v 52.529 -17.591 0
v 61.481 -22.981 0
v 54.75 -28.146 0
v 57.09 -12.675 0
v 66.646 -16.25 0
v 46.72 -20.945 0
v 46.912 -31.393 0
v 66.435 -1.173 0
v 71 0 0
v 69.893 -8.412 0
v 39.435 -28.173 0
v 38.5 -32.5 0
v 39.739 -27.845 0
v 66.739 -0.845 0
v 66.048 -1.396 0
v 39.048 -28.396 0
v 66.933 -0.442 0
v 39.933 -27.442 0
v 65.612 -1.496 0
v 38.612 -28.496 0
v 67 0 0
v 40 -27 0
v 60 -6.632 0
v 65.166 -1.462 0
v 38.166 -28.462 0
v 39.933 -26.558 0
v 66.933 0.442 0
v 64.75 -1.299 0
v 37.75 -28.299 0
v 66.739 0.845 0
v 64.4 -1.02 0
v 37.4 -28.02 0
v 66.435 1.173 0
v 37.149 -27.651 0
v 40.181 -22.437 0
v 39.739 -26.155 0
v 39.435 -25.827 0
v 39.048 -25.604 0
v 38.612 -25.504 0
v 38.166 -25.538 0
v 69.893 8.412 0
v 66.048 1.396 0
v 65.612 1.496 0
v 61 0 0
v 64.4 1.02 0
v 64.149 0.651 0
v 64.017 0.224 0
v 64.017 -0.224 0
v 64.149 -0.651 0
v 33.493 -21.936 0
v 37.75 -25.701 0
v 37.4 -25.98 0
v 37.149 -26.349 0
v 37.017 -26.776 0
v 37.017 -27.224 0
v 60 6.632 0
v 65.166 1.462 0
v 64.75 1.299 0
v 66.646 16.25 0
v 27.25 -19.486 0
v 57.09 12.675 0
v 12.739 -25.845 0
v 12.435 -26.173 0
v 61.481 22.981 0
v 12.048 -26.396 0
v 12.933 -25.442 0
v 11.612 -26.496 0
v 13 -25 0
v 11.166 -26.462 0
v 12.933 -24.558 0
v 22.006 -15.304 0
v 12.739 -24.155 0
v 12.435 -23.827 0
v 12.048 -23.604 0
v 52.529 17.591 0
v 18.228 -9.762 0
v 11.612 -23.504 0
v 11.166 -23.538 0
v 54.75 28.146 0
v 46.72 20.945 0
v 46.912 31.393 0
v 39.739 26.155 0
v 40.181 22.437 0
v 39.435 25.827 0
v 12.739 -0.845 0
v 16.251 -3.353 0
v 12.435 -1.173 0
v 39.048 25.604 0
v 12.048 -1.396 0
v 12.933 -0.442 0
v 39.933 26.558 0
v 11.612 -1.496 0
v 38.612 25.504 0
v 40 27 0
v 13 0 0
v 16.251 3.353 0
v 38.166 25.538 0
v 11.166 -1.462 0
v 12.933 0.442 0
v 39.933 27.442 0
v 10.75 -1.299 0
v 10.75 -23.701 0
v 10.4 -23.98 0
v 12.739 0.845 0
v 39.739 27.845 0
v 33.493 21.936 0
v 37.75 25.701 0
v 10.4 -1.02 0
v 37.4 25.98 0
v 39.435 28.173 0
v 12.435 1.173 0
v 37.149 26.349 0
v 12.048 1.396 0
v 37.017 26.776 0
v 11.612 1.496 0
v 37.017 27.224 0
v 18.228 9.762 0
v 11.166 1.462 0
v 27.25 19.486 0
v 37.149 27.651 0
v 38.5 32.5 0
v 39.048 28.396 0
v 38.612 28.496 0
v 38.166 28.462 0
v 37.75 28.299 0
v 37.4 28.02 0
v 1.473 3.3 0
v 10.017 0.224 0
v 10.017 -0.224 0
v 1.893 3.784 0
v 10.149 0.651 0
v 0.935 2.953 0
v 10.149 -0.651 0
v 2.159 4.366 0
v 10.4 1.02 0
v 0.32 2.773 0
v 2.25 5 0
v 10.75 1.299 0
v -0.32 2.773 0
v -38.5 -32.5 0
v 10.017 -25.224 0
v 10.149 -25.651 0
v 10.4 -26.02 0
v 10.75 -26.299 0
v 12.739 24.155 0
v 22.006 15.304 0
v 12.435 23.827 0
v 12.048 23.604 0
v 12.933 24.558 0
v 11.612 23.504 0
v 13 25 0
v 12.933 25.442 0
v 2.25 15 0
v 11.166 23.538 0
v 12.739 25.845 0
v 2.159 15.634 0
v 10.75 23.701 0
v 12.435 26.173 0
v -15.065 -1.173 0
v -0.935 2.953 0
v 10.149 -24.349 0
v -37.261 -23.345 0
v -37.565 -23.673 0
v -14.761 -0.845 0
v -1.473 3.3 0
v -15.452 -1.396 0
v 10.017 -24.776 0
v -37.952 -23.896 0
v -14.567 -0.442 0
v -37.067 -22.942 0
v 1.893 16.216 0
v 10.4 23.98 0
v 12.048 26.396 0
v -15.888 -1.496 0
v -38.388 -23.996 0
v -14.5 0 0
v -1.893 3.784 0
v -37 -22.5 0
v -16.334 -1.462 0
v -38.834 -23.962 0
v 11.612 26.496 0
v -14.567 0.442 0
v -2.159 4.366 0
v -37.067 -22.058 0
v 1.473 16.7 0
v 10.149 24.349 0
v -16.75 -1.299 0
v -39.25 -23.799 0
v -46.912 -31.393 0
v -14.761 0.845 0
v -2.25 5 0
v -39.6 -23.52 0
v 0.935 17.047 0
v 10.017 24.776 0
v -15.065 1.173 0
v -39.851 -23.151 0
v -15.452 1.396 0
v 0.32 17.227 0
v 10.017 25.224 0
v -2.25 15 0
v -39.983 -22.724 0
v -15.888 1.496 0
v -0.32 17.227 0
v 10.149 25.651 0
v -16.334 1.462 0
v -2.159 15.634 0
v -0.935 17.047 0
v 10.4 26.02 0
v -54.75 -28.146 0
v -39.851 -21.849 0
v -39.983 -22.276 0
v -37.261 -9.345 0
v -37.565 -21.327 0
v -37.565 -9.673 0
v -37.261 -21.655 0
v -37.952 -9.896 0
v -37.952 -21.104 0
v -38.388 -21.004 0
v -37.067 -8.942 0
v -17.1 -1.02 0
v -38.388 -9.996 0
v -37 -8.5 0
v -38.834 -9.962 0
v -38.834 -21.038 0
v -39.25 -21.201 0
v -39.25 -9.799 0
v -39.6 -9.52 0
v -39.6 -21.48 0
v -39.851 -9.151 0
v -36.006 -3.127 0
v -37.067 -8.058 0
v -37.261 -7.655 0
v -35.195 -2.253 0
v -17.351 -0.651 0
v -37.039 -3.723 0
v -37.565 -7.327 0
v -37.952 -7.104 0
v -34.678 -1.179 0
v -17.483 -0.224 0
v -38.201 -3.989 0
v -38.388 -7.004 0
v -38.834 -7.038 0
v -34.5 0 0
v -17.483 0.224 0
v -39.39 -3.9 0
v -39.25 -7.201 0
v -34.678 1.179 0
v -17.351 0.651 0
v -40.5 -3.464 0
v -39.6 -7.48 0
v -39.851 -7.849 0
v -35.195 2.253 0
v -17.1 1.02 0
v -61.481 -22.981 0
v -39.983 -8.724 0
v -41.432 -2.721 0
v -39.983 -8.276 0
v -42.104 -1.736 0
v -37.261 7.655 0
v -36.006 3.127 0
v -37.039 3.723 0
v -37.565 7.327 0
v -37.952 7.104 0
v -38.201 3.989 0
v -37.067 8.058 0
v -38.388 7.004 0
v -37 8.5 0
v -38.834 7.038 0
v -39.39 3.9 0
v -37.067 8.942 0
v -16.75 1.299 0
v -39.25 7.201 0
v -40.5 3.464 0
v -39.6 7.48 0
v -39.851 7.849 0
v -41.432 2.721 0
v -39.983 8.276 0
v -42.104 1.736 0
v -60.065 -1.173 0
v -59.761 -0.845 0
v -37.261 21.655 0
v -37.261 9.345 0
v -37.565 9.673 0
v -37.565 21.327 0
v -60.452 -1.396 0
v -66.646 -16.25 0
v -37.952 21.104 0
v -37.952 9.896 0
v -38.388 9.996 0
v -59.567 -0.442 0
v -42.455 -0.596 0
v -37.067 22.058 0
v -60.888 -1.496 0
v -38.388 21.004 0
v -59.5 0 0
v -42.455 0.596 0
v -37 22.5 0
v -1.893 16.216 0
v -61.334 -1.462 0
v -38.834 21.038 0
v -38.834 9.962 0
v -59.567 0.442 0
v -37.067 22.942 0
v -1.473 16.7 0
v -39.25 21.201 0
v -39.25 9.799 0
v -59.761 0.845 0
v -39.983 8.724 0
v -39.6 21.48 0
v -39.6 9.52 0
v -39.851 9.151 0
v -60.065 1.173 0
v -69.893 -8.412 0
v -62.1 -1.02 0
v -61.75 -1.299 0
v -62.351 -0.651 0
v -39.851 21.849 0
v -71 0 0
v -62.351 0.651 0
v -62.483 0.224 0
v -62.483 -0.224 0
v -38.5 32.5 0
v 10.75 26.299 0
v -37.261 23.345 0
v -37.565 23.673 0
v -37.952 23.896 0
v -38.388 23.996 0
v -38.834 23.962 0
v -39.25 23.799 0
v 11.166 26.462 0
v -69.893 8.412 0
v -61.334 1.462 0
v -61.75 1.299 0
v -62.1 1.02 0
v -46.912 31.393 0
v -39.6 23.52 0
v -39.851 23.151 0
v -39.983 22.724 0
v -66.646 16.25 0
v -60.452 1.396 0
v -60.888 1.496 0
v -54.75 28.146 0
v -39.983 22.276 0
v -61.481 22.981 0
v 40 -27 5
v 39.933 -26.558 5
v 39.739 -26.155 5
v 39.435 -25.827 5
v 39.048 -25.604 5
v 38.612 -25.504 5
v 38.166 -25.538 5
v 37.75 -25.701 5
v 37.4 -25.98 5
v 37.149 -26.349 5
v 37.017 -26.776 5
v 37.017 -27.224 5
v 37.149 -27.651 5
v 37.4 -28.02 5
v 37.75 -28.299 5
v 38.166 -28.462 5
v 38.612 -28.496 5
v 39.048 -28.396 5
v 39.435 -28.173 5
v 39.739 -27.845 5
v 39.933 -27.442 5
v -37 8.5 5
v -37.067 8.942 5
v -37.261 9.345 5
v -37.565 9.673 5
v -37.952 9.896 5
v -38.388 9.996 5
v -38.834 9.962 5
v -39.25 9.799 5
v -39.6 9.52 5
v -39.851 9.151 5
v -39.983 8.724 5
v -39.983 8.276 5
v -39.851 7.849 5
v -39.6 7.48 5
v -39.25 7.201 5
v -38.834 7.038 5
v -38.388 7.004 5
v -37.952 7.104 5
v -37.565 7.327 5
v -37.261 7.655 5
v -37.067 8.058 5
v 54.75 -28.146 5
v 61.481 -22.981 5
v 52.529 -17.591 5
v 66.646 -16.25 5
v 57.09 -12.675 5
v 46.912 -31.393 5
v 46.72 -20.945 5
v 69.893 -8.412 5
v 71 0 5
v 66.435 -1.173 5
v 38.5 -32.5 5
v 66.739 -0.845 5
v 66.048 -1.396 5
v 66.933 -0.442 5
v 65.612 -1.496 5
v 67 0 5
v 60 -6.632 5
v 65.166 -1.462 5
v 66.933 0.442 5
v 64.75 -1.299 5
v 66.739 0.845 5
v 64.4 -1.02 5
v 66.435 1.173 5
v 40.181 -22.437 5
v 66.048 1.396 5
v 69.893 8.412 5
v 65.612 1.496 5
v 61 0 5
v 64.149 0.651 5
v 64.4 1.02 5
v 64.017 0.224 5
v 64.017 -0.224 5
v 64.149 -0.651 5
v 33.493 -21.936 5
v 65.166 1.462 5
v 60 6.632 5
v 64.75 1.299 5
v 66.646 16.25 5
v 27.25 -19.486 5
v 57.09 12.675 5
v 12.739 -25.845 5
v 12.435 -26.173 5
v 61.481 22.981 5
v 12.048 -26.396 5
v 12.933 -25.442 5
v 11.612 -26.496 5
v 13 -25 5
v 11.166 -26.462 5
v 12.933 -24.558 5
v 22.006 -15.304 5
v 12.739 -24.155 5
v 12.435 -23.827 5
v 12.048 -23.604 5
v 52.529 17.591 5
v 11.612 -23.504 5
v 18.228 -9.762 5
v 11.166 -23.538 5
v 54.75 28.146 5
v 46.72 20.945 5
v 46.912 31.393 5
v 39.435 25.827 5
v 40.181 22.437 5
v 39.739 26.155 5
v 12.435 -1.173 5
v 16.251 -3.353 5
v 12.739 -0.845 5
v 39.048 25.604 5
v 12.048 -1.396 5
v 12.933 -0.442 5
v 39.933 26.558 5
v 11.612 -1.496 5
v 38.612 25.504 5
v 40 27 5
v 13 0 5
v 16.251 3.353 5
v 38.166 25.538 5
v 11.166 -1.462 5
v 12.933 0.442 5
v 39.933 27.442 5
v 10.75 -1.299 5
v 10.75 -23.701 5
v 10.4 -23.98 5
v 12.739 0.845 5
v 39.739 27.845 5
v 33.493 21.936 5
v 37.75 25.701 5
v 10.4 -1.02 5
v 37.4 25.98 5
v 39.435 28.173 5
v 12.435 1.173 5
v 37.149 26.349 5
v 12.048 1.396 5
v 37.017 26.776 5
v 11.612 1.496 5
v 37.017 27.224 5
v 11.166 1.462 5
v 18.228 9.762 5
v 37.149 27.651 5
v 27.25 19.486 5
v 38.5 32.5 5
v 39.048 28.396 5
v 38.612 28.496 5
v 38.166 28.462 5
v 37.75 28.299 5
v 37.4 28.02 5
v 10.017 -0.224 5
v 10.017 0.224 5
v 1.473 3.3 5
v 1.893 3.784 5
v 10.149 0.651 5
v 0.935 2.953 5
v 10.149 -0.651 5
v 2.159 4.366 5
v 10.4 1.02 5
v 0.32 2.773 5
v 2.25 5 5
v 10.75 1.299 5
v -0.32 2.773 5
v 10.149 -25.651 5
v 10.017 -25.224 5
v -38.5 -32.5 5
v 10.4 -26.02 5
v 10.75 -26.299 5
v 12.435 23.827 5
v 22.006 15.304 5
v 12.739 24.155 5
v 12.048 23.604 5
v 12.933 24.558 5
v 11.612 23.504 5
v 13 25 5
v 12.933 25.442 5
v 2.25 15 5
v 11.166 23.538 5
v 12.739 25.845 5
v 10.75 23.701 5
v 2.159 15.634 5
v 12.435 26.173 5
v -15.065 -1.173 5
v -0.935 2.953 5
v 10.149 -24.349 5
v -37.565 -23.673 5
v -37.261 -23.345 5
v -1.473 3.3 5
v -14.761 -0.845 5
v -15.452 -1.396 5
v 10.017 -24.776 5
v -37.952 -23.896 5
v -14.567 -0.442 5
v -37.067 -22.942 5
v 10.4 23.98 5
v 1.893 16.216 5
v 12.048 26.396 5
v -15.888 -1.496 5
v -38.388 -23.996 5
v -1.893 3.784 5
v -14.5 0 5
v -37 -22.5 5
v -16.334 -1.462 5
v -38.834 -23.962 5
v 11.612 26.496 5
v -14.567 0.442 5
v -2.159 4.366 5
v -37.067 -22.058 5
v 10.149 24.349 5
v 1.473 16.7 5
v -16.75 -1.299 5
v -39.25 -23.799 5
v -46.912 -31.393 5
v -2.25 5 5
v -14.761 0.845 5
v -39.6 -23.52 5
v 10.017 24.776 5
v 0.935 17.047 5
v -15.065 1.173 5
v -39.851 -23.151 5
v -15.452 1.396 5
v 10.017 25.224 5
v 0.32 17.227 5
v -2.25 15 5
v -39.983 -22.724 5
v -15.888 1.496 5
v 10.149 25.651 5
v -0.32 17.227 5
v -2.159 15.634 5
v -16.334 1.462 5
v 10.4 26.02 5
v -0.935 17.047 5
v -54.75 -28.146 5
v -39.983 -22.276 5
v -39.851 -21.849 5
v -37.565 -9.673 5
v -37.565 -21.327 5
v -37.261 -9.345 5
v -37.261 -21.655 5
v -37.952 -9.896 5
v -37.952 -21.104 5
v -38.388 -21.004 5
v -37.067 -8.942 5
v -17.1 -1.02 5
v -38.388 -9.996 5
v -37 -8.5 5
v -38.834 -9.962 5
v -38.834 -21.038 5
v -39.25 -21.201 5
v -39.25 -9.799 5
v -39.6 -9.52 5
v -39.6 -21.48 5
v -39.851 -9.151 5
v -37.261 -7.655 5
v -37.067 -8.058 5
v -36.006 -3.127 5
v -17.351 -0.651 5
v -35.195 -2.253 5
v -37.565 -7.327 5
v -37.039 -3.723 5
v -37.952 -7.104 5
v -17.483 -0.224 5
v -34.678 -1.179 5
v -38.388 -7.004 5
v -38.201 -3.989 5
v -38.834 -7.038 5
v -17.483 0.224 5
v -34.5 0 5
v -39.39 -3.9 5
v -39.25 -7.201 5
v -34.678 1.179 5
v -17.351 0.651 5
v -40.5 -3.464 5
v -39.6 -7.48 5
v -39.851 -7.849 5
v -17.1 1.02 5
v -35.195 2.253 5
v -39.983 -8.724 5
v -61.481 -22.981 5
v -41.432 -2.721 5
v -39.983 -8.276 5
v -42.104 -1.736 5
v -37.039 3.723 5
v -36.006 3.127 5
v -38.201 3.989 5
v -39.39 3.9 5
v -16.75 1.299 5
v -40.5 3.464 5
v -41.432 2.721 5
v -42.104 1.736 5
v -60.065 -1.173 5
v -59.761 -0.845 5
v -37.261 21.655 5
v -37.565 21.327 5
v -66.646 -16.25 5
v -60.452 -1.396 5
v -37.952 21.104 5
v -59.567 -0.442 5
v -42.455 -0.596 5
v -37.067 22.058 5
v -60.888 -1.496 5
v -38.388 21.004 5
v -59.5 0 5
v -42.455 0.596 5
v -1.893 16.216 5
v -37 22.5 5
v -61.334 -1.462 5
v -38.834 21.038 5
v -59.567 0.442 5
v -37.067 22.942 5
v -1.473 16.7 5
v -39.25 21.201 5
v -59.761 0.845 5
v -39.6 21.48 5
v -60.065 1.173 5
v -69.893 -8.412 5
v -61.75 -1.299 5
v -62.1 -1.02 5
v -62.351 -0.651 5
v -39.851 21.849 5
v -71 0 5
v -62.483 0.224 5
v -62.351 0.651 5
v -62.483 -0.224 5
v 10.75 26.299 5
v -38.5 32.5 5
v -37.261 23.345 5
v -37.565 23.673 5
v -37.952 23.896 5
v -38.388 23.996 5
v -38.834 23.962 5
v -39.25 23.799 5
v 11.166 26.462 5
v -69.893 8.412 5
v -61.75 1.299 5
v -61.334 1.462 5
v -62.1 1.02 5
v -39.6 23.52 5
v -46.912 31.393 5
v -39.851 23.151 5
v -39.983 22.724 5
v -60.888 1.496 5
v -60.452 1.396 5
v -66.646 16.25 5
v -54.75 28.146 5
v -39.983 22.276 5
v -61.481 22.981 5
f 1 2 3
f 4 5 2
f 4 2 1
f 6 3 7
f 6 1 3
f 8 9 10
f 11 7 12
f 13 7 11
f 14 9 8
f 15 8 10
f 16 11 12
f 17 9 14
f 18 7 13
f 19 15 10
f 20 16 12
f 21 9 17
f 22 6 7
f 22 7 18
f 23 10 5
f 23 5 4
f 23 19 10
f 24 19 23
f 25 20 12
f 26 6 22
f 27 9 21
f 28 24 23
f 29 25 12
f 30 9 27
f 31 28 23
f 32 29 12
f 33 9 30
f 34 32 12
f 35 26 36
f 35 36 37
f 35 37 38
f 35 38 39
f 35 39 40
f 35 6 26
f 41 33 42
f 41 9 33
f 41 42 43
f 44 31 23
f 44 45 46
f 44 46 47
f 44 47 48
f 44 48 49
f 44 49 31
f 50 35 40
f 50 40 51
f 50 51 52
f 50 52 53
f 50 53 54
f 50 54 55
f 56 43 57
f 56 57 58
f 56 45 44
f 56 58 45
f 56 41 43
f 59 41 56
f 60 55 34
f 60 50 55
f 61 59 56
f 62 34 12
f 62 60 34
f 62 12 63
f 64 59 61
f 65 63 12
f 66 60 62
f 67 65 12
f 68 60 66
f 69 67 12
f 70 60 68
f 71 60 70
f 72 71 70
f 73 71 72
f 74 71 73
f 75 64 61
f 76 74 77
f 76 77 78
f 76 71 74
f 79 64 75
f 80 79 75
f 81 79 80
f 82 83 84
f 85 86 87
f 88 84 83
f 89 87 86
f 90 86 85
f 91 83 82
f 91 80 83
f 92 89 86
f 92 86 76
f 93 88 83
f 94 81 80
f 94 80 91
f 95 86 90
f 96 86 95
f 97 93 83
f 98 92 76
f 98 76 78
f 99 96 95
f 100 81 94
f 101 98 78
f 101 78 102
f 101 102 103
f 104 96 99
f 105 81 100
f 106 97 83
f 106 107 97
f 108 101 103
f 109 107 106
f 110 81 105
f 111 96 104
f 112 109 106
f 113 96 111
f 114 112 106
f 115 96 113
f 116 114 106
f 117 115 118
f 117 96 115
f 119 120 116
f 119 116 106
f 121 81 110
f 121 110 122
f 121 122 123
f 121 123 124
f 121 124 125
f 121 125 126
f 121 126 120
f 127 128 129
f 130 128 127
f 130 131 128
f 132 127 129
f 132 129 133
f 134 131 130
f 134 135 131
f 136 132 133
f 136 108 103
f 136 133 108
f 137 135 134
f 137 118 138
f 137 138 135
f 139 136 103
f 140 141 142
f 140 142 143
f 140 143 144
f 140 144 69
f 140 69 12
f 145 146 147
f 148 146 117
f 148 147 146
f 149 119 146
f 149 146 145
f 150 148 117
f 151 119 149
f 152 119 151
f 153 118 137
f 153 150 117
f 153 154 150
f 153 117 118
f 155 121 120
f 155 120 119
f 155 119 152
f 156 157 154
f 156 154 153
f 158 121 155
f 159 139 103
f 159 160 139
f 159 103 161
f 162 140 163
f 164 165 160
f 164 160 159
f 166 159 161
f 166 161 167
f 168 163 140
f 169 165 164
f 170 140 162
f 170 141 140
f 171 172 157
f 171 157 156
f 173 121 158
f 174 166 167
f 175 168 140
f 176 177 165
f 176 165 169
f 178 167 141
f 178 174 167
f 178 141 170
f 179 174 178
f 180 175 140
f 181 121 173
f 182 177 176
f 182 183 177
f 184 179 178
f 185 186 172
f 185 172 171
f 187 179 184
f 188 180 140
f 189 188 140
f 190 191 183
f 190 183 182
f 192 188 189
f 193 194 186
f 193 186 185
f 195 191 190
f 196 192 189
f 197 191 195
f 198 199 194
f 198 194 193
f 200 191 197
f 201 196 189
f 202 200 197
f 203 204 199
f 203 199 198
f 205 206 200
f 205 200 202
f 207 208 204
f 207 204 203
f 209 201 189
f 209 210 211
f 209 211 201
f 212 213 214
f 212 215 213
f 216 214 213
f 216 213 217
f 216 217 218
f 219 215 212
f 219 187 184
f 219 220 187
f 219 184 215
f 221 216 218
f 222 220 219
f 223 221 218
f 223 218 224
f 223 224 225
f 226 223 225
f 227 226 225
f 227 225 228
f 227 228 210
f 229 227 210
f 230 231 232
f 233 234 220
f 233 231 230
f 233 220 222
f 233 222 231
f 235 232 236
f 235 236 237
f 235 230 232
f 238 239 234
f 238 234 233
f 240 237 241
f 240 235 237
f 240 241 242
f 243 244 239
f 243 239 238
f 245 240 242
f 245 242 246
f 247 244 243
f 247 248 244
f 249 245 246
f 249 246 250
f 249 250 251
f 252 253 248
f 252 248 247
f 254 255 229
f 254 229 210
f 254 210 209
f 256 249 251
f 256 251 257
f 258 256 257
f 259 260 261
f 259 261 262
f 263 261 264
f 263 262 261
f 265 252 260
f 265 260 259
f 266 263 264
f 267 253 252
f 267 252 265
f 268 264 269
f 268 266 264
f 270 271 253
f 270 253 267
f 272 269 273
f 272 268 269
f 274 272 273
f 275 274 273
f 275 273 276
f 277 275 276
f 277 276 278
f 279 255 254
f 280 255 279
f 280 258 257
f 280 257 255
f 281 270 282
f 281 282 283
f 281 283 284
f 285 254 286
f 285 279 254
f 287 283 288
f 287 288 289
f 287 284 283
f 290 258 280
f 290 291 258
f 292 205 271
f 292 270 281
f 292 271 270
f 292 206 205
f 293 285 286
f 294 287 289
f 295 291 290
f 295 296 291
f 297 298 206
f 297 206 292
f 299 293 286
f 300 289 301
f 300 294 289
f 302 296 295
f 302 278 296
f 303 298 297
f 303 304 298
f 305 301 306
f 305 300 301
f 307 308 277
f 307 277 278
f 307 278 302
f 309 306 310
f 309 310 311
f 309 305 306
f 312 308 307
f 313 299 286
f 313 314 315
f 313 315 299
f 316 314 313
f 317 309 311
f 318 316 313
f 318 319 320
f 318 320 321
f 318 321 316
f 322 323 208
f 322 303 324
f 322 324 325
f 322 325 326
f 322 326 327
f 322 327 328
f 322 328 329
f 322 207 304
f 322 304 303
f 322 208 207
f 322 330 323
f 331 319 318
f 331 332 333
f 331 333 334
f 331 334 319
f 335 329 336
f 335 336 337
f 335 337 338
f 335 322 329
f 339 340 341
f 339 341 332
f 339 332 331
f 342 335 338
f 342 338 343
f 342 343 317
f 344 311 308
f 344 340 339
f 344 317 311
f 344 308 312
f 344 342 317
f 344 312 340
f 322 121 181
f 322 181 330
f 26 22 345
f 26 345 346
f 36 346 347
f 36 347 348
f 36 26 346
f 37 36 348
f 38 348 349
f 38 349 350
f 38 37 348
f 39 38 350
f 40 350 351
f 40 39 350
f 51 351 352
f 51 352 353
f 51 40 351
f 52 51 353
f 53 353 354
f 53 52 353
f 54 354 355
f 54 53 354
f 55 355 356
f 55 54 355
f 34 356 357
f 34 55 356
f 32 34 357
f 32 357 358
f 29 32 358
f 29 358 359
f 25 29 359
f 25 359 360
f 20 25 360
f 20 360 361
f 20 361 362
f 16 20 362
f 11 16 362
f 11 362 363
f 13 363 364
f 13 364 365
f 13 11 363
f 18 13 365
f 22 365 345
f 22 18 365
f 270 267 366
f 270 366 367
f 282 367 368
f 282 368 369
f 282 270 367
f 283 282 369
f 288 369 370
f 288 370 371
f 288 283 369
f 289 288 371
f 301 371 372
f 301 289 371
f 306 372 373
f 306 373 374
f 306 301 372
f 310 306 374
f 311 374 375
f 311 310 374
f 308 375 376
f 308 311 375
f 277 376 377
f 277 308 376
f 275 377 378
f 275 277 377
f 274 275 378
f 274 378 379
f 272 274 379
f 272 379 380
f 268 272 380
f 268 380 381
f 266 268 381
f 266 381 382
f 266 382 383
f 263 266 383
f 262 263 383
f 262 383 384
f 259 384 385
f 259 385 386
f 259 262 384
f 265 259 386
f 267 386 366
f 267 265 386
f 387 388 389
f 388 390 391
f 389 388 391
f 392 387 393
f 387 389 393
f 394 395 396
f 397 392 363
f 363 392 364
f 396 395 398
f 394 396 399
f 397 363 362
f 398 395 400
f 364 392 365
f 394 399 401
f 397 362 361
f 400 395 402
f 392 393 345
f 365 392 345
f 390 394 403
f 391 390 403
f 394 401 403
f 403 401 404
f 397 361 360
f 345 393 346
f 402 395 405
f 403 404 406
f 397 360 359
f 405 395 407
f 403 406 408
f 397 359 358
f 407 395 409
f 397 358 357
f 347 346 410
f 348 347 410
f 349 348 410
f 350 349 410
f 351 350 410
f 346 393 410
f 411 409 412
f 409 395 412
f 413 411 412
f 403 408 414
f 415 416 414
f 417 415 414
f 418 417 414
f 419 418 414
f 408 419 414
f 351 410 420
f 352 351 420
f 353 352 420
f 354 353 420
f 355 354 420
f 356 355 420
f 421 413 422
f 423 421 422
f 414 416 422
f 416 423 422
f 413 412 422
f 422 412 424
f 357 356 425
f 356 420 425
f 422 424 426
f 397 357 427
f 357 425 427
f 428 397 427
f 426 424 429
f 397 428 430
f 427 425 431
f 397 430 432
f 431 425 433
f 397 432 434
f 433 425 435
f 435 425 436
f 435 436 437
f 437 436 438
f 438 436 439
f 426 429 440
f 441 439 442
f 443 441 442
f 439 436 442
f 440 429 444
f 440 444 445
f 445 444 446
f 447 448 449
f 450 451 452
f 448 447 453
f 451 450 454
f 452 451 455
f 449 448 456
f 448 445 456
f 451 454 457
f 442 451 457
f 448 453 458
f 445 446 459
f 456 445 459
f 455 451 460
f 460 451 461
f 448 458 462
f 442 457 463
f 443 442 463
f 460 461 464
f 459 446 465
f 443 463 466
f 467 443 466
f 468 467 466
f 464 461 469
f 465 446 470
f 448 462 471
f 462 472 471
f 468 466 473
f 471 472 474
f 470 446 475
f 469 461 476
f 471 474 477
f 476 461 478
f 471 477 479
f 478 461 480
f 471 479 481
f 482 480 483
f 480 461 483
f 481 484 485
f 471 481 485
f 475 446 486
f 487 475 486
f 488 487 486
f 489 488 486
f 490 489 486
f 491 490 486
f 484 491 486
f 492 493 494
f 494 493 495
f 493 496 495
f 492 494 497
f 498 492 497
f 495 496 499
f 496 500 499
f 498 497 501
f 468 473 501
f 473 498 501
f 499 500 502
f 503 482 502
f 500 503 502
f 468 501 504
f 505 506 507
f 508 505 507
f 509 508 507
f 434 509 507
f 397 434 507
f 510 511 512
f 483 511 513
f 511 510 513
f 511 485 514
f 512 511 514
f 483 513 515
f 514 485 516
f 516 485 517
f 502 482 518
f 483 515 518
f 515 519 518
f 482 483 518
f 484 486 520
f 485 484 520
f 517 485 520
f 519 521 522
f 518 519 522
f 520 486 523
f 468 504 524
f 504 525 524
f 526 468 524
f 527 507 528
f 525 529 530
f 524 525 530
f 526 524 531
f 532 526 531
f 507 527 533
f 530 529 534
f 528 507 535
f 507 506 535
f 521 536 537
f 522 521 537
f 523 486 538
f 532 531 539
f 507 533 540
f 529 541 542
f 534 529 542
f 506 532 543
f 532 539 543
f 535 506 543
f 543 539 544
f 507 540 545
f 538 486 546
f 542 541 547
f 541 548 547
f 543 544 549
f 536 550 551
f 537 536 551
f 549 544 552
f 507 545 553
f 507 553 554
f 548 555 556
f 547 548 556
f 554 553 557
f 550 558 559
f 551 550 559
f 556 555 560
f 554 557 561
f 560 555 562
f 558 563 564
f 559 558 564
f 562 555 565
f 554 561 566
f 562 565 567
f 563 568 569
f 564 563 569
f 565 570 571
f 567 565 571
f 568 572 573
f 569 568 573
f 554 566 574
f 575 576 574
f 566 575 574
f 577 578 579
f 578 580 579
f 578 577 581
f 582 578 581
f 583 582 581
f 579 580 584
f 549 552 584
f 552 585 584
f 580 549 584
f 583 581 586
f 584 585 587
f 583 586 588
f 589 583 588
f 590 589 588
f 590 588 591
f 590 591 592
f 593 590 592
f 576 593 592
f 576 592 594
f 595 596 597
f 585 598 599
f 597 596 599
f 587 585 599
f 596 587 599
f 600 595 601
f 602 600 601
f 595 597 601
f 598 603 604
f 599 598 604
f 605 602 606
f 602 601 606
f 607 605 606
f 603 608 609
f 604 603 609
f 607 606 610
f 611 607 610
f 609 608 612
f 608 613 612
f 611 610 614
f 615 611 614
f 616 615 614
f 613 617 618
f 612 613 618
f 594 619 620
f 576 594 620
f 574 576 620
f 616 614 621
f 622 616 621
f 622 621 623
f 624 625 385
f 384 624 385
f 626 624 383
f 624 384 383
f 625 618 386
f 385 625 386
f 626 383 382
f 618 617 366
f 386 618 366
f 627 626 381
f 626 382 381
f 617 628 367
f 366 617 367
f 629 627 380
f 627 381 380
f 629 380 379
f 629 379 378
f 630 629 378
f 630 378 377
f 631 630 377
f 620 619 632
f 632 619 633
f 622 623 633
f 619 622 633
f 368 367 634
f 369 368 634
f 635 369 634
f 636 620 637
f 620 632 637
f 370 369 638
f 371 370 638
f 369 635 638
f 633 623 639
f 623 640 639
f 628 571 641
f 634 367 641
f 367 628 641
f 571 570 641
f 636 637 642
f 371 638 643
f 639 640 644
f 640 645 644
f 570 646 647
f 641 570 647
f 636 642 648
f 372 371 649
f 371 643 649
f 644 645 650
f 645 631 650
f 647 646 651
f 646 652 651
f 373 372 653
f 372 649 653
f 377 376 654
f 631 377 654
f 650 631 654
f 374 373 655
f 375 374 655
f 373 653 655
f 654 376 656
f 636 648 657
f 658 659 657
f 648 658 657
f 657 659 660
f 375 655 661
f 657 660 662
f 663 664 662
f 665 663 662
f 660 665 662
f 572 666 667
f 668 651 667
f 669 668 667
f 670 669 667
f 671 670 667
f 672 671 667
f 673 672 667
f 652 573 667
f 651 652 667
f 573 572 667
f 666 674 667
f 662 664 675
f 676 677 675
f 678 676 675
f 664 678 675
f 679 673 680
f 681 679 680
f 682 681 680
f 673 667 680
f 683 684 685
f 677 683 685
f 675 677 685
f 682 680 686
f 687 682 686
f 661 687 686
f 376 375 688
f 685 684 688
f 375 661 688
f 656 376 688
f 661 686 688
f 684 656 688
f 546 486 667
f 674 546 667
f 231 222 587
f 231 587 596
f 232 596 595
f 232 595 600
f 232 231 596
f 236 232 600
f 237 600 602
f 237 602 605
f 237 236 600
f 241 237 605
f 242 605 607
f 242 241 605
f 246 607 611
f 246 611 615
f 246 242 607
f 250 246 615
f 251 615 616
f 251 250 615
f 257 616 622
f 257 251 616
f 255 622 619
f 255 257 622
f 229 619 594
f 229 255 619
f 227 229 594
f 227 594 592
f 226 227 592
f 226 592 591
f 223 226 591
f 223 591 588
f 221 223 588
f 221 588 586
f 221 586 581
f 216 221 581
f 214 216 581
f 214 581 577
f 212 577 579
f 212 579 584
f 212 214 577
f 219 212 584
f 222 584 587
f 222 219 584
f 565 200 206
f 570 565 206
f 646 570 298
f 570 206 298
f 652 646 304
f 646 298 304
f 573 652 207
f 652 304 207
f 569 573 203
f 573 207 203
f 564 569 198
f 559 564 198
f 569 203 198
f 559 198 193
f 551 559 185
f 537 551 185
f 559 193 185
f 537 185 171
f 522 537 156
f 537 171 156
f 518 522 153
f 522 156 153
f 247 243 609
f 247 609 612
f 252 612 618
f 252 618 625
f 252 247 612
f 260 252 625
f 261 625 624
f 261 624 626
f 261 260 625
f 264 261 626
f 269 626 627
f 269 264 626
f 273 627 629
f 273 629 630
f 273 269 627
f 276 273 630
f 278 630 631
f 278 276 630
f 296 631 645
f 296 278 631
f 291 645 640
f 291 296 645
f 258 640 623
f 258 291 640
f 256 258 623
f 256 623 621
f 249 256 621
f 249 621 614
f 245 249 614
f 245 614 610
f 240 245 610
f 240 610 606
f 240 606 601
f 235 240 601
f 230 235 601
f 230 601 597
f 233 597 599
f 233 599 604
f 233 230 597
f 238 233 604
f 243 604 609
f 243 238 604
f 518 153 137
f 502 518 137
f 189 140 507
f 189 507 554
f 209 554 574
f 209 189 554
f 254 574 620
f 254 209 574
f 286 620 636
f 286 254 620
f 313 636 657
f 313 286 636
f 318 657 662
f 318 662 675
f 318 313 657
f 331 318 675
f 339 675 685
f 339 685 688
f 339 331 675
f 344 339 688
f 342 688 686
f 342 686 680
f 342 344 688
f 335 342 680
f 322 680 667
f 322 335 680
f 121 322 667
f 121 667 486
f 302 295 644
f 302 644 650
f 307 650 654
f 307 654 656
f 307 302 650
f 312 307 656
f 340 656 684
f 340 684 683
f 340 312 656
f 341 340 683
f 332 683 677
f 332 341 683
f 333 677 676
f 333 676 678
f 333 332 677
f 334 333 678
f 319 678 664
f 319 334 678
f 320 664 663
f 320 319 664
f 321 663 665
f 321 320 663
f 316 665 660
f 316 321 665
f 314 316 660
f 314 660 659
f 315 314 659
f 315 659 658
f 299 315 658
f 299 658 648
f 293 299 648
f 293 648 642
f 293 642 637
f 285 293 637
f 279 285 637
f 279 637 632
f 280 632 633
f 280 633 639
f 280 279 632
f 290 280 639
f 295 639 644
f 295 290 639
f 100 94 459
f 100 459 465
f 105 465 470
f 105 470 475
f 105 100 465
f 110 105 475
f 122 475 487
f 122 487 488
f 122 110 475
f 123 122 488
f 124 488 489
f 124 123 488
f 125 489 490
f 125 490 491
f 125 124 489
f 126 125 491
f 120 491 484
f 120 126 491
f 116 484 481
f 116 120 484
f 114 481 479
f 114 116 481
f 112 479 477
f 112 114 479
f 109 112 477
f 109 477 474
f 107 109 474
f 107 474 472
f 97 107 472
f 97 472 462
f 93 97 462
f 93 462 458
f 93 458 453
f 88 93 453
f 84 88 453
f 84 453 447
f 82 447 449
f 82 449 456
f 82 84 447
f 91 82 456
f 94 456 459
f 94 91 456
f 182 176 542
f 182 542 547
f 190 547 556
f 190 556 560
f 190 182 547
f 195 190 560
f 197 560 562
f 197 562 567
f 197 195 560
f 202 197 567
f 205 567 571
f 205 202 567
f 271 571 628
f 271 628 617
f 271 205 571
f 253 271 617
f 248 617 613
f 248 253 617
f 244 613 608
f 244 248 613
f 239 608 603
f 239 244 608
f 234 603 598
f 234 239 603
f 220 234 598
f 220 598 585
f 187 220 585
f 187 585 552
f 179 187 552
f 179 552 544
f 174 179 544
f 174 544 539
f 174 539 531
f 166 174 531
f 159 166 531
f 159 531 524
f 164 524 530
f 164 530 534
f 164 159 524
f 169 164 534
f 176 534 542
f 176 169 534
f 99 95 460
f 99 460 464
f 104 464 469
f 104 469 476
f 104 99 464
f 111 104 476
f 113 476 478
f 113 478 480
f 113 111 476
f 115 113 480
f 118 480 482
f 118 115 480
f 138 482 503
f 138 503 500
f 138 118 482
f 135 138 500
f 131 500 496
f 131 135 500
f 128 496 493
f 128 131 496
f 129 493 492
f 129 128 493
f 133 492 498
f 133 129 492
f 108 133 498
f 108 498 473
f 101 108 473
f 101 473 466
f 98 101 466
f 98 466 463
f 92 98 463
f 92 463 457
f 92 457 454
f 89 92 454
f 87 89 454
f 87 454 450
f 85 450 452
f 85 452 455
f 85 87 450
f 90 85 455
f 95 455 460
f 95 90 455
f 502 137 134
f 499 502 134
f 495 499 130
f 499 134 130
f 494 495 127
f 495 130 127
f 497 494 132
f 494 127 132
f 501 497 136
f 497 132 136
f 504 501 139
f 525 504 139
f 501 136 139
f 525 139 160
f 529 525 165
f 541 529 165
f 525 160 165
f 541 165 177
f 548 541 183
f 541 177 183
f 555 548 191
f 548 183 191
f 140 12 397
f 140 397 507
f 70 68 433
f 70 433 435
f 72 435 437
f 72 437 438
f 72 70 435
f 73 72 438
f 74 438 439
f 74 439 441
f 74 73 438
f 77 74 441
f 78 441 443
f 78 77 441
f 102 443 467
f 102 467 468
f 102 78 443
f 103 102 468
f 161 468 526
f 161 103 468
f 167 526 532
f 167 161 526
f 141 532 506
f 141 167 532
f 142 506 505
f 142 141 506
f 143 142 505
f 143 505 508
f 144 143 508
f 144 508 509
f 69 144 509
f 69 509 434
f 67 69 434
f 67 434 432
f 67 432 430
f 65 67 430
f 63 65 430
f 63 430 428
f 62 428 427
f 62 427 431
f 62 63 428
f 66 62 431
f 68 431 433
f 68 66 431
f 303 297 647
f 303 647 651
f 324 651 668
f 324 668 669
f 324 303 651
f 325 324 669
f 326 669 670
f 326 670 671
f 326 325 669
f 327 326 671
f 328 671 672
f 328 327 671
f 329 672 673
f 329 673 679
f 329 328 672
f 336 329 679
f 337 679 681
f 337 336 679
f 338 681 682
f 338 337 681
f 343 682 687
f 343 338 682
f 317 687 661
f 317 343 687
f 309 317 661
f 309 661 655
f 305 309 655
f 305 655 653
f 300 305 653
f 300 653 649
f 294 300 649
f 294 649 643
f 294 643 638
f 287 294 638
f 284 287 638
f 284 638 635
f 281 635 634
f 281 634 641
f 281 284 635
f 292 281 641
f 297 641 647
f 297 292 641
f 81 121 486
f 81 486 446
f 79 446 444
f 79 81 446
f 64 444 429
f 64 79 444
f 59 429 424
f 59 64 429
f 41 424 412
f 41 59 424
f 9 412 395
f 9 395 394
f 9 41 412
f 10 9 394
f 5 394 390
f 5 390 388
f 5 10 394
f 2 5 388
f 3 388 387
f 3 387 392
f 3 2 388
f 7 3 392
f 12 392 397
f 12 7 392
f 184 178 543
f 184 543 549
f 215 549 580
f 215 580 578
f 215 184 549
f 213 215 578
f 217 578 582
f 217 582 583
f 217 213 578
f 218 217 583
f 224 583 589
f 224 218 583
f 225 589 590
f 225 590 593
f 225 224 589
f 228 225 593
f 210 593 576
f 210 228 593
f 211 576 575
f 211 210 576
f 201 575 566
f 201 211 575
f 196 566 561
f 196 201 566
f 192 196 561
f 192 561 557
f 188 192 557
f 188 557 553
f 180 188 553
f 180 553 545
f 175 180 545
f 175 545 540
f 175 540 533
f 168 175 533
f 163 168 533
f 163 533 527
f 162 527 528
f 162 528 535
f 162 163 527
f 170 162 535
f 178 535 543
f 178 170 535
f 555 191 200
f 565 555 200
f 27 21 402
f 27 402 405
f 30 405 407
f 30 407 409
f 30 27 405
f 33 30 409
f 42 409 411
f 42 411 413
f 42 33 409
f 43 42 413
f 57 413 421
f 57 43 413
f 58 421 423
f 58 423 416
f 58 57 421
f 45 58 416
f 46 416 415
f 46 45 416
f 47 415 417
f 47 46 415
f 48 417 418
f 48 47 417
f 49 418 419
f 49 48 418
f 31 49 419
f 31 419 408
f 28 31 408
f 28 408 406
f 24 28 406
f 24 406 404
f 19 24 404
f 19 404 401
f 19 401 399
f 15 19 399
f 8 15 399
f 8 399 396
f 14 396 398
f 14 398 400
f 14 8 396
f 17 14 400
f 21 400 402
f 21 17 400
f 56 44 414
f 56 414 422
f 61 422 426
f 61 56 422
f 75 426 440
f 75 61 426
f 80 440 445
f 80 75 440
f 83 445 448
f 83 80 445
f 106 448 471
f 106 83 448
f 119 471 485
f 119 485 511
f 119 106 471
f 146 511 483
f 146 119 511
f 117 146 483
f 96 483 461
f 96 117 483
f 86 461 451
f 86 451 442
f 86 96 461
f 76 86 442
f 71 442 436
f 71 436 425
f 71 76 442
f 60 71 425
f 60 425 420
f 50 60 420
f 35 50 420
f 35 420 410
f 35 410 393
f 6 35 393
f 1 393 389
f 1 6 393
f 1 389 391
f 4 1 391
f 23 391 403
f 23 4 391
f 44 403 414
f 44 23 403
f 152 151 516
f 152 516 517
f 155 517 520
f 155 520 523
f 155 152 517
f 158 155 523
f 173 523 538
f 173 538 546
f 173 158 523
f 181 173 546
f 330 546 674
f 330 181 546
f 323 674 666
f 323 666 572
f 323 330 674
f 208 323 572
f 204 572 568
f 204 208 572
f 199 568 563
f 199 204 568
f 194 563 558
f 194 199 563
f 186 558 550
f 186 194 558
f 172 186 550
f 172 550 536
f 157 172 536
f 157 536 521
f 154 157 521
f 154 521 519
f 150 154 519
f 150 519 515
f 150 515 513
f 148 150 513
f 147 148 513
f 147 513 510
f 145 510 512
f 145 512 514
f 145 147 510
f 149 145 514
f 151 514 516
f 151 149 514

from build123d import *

# Parameters (mm, degrees)
SKETCH1_R           = 4
SKETCH1_R_2         = 22.5
SKETCH1_R_3         = 1.5
BOSS_EXTRUDE1_DEPTH = 5


with BuildPart() as part:
    # Sketch1 → Boss-Extrude1 (new body)
    with BuildSketch(Plane.XY):
        with BuildLine():
            Line((-38.5, 32.5), (38.5, 32.5))
            ThreePointArc((38.5, 32.5), (71, 0), (38.5, -32.5))
            Line((38.5, -32.5), (-38.5, -32.5))
            ThreePointArc((-38.5, -32.5), (-71, 0), (-38.5, 32.5))
        make_face()
        with Locations((-38.5, 0)):
            Circle(SKETCH1_R, mode=Mode.SUBTRACT)
        with Locations((38.5, 0)):
            Circle(SKETCH1_R_2, mode=Mode.SUBTRACT)
        with Locations((-38.5, 22.5)):
            Circle(SKETCH1_R_3, mode=Mode.SUBTRACT)
        with Locations((-16, 0)):
            Circle(SKETCH1_R_3, mode=Mode.SUBTRACT)
        with Locations((-38.5, -22.5)):
            Circle(SKETCH1_R_3, mode=Mode.SUBTRACT)
        with Locations((-61, 0)):
            Circle(SKETCH1_R_3, mode=Mode.SUBTRACT)
        with Locations((11.5, 0)):
            Circle(SKETCH1_R_3, mode=Mode.SUBTRACT)
        with Locations((11.5, -25)):
            Circle(SKETCH1_R_3, mode=Mode.SUBTRACT)
        with Locations((11.5, 25)):
            Circle(SKETCH1_R_3, mode=Mode.SUBTRACT)
        with Locations((65.5, 0)):
            Circle(SKETCH1_R_3, mode=Mode.SUBTRACT)
        with Locations((-38.5, 8.5)):
            Circle(SKETCH1_R_3, mode=Mode.SUBTRACT)
        with Locations((-38.5, -8.5)):
            Circle(SKETCH1_R_3, mode=Mode.SUBTRACT)
        with Locations((38.5, 27)):
            Circle(SKETCH1_R_3, mode=Mode.SUBTRACT)
        with Locations((38.5, -27)):
            Circle(SKETCH1_R_3, mode=Mode.SUBTRACT)
        with BuildLine():
            Line((-2.25, 5), (-2.25, 15))
            ThreePointArc((-2.25, 15), (0, 17.25), (2.25, 15))
            Line((2.25, 15), (2.25, 5))
            ThreePointArc((2.25, 5), (0, 2.75), (-2.25, 5))
        make_face(mode=Mode.SUBTRACT)
    extrude(amount=BOSS_EXTRUDE1_DEPTH)


solid = part.part
